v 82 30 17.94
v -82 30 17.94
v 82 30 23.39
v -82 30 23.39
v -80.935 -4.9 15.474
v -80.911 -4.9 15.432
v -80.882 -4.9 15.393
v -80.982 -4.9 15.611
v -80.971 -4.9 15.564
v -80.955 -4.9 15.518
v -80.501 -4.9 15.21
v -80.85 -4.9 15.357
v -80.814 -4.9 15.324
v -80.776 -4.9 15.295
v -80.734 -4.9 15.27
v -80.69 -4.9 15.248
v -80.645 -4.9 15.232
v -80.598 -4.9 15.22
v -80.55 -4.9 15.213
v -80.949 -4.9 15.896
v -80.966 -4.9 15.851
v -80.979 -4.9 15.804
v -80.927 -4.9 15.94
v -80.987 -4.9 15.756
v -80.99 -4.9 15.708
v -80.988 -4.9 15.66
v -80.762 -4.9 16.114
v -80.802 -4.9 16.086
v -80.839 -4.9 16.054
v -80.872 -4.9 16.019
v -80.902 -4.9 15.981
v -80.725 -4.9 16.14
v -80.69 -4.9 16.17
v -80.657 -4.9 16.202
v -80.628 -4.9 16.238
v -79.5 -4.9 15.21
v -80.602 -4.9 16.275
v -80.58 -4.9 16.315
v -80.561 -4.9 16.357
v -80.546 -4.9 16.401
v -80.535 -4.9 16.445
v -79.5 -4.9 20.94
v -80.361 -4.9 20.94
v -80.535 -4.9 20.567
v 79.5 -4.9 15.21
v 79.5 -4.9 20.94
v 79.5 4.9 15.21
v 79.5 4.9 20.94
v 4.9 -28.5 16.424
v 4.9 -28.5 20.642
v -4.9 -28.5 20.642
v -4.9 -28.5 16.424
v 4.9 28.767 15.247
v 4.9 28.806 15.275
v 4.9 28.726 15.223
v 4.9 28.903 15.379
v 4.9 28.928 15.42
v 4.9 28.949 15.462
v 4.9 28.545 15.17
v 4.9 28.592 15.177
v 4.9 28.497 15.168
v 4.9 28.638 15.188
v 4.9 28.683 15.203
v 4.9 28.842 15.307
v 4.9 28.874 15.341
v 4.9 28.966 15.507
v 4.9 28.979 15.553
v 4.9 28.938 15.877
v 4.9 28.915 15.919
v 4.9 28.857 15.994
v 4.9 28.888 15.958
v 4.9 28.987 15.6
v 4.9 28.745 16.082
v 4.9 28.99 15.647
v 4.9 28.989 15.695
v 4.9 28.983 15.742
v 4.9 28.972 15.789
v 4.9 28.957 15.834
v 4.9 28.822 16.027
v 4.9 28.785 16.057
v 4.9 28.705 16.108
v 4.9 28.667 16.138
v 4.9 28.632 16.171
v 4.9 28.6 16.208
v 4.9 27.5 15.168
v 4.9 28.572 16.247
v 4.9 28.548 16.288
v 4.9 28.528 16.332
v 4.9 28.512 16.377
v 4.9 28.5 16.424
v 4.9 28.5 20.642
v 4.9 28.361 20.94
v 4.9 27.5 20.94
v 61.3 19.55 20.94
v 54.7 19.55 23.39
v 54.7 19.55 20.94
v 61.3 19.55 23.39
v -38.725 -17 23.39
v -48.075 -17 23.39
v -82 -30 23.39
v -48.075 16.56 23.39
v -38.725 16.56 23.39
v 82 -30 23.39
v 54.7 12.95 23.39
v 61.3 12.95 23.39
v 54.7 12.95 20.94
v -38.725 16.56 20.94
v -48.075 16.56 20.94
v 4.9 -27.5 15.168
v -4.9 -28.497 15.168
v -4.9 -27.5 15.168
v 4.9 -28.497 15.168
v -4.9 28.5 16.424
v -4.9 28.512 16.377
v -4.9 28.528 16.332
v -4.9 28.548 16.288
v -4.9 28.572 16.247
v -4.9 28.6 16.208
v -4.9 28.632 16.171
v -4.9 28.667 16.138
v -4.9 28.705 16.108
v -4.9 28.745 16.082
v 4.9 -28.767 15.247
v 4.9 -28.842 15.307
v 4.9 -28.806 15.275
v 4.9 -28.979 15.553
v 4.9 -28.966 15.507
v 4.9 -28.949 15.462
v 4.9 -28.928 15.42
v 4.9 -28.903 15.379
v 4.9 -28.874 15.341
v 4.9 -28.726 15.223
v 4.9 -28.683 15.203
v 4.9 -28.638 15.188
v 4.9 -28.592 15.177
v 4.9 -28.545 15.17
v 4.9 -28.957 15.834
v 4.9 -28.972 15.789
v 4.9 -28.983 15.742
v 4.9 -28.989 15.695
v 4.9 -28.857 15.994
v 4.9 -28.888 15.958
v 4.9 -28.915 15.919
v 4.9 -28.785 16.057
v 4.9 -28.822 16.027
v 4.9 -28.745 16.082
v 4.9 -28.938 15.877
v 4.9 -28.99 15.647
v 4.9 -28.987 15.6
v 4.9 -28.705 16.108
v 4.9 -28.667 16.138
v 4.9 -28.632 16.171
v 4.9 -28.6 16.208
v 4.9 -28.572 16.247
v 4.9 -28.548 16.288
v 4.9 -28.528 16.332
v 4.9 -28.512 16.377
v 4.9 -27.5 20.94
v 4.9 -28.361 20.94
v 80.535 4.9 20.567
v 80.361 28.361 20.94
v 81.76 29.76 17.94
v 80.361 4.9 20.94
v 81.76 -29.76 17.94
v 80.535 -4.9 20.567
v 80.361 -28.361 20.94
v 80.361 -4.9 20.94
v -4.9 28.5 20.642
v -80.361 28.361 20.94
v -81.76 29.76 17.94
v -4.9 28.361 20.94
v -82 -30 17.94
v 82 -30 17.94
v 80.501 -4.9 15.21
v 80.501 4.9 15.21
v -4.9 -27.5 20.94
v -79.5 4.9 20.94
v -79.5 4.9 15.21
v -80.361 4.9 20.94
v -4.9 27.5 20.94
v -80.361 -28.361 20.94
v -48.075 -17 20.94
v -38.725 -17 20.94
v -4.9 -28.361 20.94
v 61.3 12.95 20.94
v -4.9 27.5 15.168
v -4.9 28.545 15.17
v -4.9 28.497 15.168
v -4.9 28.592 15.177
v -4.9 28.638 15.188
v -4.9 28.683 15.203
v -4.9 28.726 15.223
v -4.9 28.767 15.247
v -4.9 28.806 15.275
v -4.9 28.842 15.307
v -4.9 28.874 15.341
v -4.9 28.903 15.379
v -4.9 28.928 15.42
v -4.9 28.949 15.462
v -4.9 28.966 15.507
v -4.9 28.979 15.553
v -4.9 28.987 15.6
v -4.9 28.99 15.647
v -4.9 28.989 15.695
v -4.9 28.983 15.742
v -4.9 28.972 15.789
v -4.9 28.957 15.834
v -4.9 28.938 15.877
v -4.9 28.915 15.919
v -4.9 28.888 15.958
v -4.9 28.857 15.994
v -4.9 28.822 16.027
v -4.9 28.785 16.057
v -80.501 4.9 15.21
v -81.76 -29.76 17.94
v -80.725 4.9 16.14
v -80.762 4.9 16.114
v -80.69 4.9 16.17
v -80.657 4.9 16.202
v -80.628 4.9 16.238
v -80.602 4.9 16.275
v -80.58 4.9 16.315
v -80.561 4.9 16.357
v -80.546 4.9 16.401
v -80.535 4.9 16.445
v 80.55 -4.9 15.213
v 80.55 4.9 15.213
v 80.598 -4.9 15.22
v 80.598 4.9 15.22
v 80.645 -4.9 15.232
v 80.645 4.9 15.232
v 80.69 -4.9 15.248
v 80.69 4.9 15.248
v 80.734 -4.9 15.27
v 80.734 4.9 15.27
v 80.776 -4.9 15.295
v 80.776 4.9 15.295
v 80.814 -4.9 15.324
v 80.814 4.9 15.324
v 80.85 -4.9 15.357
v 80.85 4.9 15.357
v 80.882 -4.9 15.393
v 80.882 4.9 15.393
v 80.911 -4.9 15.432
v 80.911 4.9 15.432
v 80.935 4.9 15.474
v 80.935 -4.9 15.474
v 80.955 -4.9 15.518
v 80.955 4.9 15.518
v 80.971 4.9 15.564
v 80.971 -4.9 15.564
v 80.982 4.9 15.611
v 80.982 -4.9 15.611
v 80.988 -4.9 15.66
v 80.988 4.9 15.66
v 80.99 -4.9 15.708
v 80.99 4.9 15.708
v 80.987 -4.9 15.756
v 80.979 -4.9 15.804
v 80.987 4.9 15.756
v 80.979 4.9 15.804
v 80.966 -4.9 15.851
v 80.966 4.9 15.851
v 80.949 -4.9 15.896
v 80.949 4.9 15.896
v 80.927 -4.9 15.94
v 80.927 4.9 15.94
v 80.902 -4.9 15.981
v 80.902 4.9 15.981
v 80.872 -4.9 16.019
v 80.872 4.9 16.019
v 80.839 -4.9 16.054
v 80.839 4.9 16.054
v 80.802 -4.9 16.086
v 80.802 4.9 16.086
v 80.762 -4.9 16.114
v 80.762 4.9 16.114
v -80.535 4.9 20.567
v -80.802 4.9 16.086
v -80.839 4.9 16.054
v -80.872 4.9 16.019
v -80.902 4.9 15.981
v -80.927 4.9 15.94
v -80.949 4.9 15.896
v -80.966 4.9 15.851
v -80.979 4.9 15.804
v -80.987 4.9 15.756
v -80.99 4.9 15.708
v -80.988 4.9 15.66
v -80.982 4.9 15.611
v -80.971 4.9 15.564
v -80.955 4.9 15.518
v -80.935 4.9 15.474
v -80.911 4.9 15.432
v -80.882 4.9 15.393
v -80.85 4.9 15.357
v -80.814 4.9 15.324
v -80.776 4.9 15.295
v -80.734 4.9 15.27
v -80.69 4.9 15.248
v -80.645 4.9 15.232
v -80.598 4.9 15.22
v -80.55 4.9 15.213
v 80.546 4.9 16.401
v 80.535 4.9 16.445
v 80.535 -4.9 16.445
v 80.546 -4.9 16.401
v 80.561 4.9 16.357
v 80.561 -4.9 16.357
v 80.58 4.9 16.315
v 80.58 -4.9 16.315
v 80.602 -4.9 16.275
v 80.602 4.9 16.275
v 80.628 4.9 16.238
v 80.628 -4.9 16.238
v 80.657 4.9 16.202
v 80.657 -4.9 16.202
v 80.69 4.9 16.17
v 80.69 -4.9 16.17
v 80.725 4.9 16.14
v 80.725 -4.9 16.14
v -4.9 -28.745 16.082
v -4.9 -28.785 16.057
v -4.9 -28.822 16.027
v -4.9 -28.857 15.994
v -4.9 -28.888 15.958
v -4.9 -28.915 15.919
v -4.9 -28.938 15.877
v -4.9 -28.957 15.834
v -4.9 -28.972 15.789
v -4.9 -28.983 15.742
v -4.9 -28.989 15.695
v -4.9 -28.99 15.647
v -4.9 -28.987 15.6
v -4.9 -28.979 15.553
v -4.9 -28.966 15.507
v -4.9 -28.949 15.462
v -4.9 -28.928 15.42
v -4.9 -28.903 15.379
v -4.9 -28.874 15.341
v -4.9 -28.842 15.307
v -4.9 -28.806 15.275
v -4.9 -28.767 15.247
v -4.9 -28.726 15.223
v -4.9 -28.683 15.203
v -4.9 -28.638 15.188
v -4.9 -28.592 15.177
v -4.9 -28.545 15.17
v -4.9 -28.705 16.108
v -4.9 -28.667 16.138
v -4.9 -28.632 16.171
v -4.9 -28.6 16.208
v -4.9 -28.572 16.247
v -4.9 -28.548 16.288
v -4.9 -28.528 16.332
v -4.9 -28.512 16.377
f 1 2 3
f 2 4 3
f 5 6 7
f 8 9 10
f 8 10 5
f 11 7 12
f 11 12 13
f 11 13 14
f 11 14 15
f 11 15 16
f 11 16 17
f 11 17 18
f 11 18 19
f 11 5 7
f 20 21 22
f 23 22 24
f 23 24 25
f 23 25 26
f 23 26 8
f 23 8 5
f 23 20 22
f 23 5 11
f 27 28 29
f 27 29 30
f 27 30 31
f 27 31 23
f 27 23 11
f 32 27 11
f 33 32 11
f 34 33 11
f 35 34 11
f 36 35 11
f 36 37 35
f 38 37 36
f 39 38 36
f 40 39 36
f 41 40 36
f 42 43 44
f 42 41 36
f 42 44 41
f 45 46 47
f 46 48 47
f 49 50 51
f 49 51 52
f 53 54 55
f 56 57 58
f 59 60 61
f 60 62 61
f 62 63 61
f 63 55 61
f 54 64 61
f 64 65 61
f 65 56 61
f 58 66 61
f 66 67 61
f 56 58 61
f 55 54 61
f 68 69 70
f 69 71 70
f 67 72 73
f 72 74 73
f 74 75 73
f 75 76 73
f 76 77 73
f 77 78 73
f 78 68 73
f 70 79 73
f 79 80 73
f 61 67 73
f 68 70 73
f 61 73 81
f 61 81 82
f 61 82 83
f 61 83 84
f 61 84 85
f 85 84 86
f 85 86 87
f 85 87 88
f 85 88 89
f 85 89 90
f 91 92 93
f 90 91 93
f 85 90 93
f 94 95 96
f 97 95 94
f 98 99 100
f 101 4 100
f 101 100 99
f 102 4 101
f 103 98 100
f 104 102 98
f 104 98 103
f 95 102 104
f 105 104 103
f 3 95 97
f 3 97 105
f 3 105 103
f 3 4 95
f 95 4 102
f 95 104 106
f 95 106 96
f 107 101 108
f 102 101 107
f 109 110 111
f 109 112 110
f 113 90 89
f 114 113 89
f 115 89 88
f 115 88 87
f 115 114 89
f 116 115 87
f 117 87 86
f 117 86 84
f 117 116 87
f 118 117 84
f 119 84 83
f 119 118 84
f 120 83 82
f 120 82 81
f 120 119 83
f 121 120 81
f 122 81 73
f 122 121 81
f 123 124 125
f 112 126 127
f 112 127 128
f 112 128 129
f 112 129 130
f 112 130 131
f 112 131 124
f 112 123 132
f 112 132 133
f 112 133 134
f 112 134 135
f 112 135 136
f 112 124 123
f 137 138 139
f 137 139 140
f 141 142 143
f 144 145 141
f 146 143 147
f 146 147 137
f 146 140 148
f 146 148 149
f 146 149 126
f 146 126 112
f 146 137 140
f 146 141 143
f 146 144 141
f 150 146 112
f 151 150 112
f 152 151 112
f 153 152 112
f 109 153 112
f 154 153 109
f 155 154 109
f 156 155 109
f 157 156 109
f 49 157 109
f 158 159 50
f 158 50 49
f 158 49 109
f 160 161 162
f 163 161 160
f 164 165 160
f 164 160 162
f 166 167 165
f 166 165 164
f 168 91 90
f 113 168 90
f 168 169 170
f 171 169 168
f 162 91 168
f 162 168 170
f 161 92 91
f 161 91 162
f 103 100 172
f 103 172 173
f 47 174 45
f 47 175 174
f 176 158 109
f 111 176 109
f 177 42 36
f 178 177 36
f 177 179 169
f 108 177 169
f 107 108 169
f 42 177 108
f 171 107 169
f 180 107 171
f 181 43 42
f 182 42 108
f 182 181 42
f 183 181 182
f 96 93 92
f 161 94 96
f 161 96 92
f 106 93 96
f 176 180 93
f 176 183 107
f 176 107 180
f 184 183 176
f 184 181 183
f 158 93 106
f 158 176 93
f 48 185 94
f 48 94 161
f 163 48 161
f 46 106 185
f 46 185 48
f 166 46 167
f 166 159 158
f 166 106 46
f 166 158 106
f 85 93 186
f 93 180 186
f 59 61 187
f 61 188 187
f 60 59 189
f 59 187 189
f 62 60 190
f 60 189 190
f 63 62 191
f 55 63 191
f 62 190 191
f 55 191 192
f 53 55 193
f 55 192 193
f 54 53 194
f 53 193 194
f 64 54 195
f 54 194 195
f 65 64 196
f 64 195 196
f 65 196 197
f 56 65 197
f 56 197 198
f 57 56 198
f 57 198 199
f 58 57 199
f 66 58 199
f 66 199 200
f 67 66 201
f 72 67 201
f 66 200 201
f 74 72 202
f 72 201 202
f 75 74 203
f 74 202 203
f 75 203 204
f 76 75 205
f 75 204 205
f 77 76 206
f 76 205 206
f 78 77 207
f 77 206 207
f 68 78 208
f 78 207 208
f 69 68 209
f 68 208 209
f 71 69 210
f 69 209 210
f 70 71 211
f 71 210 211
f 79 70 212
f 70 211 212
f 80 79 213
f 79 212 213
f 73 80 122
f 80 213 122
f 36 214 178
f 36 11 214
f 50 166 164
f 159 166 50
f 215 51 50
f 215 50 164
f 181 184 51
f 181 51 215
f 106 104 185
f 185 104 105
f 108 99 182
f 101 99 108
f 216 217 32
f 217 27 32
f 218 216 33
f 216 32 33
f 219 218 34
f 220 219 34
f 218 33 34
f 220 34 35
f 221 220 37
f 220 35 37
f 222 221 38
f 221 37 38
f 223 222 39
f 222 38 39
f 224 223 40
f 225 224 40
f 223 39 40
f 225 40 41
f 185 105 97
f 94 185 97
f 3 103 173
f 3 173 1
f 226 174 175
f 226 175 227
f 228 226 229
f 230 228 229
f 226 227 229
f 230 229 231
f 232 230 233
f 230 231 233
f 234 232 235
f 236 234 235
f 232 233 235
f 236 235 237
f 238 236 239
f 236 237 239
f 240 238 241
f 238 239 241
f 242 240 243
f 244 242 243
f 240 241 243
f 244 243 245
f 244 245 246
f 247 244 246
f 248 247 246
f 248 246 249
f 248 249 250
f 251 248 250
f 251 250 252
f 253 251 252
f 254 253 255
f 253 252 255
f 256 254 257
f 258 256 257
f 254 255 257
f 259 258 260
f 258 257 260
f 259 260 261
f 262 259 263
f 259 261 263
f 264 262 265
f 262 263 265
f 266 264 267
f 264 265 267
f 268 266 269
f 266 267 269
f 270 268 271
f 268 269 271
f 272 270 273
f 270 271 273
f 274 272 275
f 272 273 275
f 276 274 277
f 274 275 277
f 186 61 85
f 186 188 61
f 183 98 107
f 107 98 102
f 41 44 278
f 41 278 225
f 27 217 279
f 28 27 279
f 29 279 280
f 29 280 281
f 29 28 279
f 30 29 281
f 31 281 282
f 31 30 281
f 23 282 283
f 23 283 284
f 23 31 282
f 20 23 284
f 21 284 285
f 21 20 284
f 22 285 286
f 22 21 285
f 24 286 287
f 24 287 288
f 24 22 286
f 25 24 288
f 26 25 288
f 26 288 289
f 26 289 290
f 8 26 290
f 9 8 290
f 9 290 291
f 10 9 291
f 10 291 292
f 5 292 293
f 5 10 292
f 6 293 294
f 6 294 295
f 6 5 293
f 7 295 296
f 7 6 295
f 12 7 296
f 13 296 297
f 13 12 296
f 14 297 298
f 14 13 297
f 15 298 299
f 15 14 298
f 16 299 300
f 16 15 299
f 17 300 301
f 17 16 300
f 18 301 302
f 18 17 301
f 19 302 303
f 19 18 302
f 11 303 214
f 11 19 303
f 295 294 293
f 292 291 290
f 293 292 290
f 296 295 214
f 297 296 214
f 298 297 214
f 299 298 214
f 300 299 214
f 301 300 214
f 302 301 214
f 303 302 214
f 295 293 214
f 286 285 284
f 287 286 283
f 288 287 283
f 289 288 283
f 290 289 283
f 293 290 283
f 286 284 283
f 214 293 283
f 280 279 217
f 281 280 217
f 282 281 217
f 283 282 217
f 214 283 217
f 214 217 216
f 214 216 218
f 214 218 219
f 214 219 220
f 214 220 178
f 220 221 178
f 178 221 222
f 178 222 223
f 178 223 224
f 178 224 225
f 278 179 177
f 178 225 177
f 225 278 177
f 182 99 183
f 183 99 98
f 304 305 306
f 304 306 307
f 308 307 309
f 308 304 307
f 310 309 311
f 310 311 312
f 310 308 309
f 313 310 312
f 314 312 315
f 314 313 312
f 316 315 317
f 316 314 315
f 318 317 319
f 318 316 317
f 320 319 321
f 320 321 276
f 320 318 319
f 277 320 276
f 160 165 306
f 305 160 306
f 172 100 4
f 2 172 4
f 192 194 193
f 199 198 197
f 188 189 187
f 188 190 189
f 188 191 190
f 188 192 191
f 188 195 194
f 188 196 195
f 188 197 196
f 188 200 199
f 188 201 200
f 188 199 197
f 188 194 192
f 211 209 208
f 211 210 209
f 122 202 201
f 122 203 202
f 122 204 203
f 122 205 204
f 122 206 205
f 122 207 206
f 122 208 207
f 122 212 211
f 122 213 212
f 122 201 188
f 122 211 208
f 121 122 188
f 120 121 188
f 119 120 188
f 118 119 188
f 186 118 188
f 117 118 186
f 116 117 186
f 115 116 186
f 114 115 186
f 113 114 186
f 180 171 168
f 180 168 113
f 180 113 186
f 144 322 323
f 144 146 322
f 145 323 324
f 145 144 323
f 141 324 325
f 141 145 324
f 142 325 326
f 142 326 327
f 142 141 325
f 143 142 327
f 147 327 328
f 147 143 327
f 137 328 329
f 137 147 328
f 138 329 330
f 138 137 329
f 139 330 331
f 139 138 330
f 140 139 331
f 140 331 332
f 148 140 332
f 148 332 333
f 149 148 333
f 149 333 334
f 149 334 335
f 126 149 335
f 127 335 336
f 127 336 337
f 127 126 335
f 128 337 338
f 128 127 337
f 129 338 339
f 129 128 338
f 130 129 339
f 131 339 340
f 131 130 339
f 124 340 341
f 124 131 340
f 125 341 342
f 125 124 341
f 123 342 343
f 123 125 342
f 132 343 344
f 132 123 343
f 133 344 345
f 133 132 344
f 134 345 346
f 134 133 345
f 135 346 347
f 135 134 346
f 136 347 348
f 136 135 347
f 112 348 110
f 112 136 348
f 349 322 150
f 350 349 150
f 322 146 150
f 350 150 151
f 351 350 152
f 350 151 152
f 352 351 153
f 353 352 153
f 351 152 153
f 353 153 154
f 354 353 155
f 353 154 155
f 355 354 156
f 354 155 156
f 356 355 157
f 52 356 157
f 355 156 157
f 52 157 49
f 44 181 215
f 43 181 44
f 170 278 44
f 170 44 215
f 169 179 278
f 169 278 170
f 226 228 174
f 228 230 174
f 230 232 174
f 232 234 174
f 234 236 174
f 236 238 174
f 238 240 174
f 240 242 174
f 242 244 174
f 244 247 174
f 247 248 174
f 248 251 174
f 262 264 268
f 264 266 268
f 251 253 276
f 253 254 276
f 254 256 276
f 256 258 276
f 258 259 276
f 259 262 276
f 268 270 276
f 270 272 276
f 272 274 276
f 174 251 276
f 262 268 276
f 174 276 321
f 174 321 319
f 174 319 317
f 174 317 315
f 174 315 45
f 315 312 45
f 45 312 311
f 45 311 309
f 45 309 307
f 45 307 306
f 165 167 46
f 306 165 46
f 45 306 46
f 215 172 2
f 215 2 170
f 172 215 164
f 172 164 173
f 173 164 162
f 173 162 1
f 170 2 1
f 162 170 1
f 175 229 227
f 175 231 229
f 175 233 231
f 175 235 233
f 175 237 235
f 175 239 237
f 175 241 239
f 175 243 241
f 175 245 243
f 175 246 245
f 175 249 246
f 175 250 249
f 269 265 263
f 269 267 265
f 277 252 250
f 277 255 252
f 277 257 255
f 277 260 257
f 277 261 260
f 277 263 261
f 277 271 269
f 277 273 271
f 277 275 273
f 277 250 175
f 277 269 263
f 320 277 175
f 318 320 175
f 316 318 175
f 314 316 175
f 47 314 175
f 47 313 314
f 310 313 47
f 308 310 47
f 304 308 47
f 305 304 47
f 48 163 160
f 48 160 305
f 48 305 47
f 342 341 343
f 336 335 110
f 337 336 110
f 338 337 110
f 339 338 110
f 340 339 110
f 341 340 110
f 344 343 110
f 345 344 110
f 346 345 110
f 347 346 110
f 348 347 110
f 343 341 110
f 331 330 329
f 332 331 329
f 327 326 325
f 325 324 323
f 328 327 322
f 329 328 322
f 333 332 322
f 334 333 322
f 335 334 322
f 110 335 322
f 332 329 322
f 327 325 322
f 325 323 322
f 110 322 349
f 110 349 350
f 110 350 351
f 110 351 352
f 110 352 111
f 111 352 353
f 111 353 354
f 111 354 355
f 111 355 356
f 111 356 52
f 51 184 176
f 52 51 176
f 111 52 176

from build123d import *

# Parameters (mm, degrees)
SKETCH008_W       = 164
SKETCH008_H       = 60
PAD003_DEPTH      = 2.5
PAD003_DEPTH_BACK = 2.95
SKETCH009_W       = 163.52
SKETCH009_H       = 59.52
POCKET005_DEPTH   = 3
POCKET005_TAPER   = 25
PAD004_DEPTH      = 4.9
PAD004_DEPTH_BACK = 4.9
PAD005_DEPTH      = 4.9
PAD005_DEPTH_BACK = 4.9
SKETCH012_W       = 9.35
SKETCH012_H       = 33.56
SKETCH012_W_2     = 6.6
SKETCH012_H_2     = 6.6
POCKET006_DEPTH   = 2.45


with BuildPart() as part:
    # Sketch008 (on ShapeBinder) → Pad003 (new body, two sides)
    with BuildSketch(Plane.XY.offset(20.89)) as pad003_sk:
        Rectangle(SKETCH008_W, SKETCH008_H)
    extrude(amount=PAD003_DEPTH)
    extrude(pad003_sk.sketch, amount=-PAD003_DEPTH_BACK)

    # Sketch009 (on Face5 of Pad003) → Pocket005 (cut)
    with BuildSketch(Plane(origin=(0, 0, 17.94), x_dir=(1, 0, 0), z_dir=(0, 0, -1))):
        Rectangle(SKETCH009_W, SKETCH009_H)
    extrude(amount=-POCKET005_DEPTH, taper=POCKET005_TAPER, mode=Mode.SUBTRACT)

    # Sketch010 → Pad004 (join, two sides)
    with BuildSketch(Plane.YZ) as pad004_sk:
        with BuildLine():
            Line((-27.5, 20.94), (-28.5, 20.94))
            Line((-28.5, 20.94), (-28.5, 16.423975))
            ThreePointArc((-28.745041, 16.082391), (-28.58568, 16.226755), (-28.5, 16.423975))
            ThreePointArc((-28.745041, 16.082391), (-28.97303, 15.529737), (-28.497162, 15.167859))
            Line((-28.497162, 15.167859), (-27.5, 15.167859))
            Line((-27.5, 20.94), (-27.5, 15.167859))
        make_face()
        with BuildLine():
            Line((27.5, 20.94), (28.5, 20.94))
            Line((28.5, 20.94), (28.5, 16.423975))
            ThreePointArc((28.5, 16.423975), (28.58568, 16.226755), (28.745041, 16.082391))
            ThreePointArc((28.497162, 15.167859), (28.97303, 15.529737), (28.745041, 16.082391))
            Line((28.497162, 15.167859), (27.5, 15.167859))
            Line((27.5, 20.94), (27.5, 15.167859))
        make_face()
    extrude(amount=PAD004_DEPTH)
    extrude(pad004_sk.sketch, amount=-PAD004_DEPTH_BACK)

    # Sketch011 → Pad005 (join, two sides)
    with BuildSketch(Plane.XZ) as pad005_sk:
        with BuildLine():
            Line((-79.5, 20.94), (-80.534817, 20.94))
            Line((-80.534817, 20.94), (-80.534817, 16.445032))
            ThreePointArc((-80.76226, 16.114088), (-80.614588, 16.256228), (-80.534817, 16.445032))
            ThreePointArc((-80.76226, 16.114088), (-80.970904, 15.564248), (-80.501498, 15.209968))
            Line((-80.501498, 15.209968), (-79.5, 15.209968))
            Line((-79.5, 20.94), (-79.5, 15.209968))
        make_face()
        with BuildLine():
            Line((79.5, 20.94), (80.534817, 20.94))
            Line((80.534817, 20.94), (80.534817, 16.445032))
            ThreePointArc((80.534817, 16.445032), (80.614588, 16.256228), (80.76226, 16.114088))
            ThreePointArc((80.501498, 15.209968), (80.970904, 15.564248), (80.76226, 16.114088))
            Line((80.501498, 15.209968), (79.5, 15.209968))
            Line((79.5, 20.94), (79.5, 15.209968))
        make_face()
    extrude(amount=PAD005_DEPTH)
    extrude(pad005_sk.sketch, amount=-PAD005_DEPTH_BACK)

    # Sketch012 (on Face5 of Pad005) → Pocket006 (cut)
    with BuildSketch(Plane.XY.offset(23.39)):
        with Locations((-43.4, -0.22)):
            Rectangle(SKETCH012_W, SKETCH012_H)
        with Locations((58, 16.25)):
            Rectangle(SKETCH012_W_2, SKETCH012_H_2)
    extrude(amount=-POCKET006_DEPTH, mode=Mode.SUBTRACT)


solid = part.part
